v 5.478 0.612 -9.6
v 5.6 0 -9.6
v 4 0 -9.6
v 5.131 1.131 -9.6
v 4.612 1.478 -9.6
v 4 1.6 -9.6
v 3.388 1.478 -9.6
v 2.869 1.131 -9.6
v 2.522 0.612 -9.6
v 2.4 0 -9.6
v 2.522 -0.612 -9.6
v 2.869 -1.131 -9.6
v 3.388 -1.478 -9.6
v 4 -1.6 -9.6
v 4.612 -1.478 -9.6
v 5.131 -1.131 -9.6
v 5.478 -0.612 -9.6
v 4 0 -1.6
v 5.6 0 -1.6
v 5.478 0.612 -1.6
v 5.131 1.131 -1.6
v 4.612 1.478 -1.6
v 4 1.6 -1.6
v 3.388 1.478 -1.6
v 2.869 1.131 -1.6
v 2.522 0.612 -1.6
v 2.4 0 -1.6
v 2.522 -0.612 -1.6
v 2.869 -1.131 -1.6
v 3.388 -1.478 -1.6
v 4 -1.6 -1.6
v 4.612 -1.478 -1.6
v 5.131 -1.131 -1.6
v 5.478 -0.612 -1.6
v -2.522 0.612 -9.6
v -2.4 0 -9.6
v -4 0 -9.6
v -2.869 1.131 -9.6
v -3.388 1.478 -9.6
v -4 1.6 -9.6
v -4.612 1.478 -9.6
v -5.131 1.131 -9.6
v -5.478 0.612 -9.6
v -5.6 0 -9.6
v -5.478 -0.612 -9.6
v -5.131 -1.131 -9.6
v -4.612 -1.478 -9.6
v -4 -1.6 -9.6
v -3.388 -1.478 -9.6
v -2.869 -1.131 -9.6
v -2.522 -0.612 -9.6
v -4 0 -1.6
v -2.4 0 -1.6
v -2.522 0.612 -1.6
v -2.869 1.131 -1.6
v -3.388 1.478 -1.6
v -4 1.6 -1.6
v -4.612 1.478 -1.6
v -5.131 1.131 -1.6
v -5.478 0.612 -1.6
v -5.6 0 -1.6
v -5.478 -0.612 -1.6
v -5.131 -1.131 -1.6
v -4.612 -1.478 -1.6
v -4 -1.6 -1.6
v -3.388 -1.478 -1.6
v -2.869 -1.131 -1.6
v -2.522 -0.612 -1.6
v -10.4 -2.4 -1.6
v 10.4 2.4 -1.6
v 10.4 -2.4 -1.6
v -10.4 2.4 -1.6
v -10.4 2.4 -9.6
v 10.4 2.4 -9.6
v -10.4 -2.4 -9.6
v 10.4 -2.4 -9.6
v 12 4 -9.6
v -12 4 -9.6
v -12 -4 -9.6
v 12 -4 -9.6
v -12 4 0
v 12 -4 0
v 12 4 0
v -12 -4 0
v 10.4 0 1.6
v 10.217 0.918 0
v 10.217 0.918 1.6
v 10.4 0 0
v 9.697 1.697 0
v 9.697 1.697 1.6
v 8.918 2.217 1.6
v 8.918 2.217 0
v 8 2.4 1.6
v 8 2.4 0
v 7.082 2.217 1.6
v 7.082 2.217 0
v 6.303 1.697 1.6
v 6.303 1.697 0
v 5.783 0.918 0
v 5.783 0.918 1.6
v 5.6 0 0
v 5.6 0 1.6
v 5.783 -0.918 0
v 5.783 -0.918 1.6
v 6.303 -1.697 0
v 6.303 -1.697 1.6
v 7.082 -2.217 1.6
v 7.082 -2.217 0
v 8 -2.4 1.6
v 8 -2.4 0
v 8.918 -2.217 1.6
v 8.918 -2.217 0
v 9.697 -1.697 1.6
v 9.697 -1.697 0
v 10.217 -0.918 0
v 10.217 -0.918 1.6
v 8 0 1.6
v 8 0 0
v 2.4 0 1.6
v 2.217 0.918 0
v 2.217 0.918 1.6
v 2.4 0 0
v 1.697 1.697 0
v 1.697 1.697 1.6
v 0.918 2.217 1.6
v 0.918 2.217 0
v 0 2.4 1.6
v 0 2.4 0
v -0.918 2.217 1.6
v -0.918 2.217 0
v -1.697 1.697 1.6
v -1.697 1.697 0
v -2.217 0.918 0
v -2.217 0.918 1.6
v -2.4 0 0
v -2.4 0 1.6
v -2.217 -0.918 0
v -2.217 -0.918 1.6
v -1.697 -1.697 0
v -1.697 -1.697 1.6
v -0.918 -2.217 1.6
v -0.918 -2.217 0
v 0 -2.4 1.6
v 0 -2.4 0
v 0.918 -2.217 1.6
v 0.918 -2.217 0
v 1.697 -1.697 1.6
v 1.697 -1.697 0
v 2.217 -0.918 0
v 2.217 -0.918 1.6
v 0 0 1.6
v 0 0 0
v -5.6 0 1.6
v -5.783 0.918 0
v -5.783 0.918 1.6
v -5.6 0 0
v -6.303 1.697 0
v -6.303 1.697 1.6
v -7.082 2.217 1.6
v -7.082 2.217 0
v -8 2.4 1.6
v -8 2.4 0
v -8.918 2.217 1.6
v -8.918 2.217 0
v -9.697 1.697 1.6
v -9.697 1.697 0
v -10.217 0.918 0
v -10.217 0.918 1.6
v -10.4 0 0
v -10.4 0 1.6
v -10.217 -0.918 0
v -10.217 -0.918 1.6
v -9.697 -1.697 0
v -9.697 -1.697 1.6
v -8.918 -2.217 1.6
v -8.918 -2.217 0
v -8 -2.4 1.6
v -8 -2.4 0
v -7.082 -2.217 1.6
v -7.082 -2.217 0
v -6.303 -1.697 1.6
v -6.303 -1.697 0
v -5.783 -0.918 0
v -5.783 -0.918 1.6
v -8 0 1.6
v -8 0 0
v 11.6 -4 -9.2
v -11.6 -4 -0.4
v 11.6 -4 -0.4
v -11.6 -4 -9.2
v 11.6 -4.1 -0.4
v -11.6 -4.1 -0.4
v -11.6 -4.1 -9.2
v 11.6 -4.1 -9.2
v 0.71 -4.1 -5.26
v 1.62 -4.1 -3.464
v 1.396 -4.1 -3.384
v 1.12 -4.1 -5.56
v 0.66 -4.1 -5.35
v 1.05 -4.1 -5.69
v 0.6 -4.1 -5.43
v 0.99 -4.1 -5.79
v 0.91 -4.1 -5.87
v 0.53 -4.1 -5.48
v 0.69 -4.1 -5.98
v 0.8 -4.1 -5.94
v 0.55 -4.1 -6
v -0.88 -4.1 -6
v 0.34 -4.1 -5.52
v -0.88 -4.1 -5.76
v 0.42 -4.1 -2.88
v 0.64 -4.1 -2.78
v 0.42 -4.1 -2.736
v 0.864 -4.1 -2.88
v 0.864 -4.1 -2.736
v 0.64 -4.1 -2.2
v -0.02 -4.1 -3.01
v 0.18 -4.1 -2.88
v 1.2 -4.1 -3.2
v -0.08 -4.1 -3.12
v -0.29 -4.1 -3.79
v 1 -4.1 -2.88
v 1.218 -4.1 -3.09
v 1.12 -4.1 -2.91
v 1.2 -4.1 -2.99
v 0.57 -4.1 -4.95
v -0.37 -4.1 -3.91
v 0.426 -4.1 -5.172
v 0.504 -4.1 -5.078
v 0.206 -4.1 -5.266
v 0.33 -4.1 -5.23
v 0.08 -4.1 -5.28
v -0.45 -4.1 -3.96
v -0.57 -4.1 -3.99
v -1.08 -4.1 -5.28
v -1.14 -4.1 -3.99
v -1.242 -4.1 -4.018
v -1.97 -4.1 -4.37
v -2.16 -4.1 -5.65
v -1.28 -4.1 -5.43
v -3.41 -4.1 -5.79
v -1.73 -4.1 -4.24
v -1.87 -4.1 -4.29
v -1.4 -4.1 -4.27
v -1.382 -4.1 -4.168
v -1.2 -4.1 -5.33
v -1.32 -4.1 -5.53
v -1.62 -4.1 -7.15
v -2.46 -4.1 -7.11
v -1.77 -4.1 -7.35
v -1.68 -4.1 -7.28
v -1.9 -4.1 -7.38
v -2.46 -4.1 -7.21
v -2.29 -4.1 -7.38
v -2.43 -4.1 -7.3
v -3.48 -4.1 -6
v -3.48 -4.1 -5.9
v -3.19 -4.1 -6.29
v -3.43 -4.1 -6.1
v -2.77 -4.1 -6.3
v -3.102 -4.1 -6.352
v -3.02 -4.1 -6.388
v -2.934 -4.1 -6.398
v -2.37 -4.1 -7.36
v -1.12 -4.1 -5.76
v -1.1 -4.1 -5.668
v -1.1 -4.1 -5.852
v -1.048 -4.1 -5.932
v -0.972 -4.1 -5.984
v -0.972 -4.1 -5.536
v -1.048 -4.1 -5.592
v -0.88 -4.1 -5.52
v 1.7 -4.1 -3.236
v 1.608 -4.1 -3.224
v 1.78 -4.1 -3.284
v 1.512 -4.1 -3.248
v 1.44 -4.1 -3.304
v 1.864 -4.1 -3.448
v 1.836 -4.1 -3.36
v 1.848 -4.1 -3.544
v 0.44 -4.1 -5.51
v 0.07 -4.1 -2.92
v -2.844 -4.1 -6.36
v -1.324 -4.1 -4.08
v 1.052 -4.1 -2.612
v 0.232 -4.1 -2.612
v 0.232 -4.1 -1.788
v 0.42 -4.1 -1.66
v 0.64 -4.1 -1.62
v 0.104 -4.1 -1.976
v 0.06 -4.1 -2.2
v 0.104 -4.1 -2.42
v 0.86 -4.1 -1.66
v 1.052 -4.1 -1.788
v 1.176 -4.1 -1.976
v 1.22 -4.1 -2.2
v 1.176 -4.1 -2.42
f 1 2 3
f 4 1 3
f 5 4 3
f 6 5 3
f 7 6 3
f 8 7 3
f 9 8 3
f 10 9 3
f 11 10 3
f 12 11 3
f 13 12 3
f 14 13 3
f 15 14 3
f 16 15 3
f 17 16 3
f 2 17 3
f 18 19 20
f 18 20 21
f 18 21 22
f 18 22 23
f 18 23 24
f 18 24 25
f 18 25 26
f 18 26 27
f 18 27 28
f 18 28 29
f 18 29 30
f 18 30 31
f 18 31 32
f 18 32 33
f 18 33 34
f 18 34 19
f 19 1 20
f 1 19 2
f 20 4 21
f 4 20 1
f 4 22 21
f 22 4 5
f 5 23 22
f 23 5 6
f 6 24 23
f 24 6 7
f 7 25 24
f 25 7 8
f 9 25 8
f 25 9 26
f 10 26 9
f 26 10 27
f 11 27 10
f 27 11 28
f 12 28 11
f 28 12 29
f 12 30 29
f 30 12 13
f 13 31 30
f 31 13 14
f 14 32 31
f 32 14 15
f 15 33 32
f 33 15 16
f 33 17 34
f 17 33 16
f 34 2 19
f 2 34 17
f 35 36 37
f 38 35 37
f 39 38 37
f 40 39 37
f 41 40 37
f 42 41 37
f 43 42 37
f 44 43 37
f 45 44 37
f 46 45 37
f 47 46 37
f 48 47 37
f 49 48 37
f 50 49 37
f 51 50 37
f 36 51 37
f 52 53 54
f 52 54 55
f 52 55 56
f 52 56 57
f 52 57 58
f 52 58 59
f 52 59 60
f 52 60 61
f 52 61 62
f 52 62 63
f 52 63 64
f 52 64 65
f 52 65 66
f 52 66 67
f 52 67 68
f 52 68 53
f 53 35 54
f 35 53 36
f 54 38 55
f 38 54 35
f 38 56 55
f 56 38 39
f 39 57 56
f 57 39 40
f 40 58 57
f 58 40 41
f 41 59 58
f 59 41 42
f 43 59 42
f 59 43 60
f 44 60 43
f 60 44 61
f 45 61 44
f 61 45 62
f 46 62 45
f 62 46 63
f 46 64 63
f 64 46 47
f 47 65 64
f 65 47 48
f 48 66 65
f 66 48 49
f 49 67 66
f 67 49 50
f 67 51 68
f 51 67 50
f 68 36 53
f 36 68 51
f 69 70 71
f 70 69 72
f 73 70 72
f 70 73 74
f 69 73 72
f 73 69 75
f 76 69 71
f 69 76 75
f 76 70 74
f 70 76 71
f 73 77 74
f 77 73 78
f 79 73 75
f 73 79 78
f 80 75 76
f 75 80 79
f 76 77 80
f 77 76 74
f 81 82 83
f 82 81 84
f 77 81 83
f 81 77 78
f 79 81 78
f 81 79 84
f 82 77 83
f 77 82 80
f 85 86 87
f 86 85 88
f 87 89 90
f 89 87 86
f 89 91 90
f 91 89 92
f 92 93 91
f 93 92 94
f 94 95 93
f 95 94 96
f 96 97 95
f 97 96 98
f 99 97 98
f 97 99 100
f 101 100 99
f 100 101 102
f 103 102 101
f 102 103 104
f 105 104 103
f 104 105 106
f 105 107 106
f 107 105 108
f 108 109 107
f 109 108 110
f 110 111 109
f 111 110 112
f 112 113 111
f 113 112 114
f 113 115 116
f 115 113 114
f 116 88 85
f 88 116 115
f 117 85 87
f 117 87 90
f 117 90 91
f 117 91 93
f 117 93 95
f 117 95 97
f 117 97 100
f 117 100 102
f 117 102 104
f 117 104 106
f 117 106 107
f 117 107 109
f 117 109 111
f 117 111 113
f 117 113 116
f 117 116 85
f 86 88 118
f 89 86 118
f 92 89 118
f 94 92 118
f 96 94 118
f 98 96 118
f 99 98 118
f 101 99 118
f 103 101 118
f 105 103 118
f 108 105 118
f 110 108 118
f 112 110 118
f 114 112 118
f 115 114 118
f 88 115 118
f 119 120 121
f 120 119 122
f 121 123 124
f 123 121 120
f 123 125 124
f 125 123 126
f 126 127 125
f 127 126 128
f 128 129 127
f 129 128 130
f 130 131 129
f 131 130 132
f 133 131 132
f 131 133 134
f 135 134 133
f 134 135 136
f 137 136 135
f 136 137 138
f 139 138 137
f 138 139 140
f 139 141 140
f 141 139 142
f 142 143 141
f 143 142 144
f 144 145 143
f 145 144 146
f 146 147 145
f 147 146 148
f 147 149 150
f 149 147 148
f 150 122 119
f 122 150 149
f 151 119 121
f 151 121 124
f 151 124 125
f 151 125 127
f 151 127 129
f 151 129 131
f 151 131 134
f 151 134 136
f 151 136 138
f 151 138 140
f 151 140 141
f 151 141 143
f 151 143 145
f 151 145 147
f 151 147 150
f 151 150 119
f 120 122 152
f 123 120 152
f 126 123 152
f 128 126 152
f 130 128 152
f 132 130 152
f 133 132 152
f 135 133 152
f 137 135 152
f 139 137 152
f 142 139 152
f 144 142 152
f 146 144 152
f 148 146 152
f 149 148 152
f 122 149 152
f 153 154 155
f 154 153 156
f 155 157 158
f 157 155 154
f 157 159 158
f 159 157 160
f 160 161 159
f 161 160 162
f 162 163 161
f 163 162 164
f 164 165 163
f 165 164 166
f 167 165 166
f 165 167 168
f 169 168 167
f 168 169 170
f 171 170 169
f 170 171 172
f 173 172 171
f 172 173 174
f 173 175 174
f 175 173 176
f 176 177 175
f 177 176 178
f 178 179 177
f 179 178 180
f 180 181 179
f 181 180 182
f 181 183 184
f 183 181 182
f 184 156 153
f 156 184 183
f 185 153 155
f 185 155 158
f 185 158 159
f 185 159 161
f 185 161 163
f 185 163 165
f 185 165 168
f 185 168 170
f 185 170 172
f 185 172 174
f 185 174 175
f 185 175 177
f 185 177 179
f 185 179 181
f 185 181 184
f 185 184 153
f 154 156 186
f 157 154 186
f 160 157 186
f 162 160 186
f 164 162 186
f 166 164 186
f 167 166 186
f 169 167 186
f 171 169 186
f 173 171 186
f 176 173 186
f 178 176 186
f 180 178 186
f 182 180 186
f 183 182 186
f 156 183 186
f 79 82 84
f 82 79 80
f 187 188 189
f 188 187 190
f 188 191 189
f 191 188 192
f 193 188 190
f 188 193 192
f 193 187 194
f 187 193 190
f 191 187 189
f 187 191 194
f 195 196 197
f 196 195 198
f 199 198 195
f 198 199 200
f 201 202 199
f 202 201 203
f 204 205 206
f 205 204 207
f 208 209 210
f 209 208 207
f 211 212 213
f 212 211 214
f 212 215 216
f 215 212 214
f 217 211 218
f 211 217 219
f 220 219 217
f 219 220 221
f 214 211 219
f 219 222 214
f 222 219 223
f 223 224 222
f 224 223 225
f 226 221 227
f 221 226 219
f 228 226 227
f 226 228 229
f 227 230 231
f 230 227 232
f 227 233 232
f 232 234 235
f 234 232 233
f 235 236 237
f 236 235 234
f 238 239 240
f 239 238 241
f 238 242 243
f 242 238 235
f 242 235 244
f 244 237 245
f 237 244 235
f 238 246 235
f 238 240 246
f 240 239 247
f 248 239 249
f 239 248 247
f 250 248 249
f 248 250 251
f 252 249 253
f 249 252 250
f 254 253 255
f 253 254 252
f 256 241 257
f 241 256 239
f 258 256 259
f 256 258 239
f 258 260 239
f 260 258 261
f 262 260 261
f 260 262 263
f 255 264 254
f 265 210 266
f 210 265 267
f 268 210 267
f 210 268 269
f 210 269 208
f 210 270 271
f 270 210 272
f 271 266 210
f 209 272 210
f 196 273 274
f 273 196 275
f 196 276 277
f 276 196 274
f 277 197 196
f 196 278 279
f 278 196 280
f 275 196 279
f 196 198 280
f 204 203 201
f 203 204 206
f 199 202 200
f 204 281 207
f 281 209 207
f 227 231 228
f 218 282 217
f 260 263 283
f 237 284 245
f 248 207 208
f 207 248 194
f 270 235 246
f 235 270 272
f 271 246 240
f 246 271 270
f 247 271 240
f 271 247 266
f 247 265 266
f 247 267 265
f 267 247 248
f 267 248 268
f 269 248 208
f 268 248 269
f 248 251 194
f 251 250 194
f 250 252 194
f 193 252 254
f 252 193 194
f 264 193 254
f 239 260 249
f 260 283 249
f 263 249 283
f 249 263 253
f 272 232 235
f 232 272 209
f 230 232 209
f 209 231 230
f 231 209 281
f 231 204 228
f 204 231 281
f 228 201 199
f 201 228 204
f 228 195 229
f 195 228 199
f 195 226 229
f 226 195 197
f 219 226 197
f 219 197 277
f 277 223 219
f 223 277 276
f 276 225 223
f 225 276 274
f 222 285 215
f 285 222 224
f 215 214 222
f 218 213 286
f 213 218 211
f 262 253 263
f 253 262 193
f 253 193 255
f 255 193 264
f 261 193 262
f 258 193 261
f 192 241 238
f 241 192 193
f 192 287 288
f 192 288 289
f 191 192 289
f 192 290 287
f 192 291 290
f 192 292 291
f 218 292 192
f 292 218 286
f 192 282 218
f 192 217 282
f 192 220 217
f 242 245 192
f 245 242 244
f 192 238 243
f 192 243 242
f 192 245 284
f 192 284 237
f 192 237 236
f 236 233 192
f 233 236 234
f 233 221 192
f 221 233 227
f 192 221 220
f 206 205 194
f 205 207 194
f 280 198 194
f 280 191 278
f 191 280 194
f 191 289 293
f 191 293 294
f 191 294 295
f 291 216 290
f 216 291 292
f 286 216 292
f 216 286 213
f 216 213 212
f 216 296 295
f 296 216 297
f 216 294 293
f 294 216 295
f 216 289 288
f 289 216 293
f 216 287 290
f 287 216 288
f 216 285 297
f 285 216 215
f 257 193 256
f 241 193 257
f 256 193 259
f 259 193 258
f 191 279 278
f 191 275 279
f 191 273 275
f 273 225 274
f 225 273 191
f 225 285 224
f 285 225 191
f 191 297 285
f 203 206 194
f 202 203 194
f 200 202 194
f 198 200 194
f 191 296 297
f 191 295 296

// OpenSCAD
// file: ../p/4-4edge.scad
use <../lib.scad>
function ldraw_lib__4_4edge() = [
// 0 Circle 1.0
// 0 Name: 4-4edge.dat
// 0 Author: James Jessiman
// 0 !LDRAW_ORG Primitive UPDATE 2017-01
// 0 !LICENSE Licensed under CC BY 2.0 and CC BY 4.0 : see CAreadme.txt
// 
// 0 BFC CERTIFY CCW
  [0,"BFC","CERTIFY"],
  [0,"BFC","CCW"],
// 
// 0 !HISTORY 1998-12-15 [PTadmin] Official Update 1998-10
// 0 !HISTORY 2005-12-28 [PTadmin] Official Update 2005-01
// 0 !HISTORY 2007-06-24 [PTadmin] Header formatted for Contributor Agreement
// 0 !HISTORY 2008-07-01 [PTadmin] Official Update 2008-01
// 0 !HISTORY 2017-01-15 [Steffen] BFCed
// 0 !HISTORY 2017-12-30 [PTadmin] Official Update 2017-01
// 
// 
// 2 24 1 0 0 0.9239 0 0.3827
  [2,24,1,0,0,0.9239,0,0.3827],
// 2 24 0.9239 0 0.3827 0.7071 0 0.7071
  [2,24,0.9239,0,0.3827,0.7071,0,0.7071],
// 2 24 0.7071 0 0.7071 0.3827 0 0.9239
  [2,24,0.7071,0,0.7071,0.3827,0,0.9239],
// 2 24 0.3827 0 0.9239 0 0 1
  [2,24,0.3827,0,0.9239,0,0,1],
// 2 24 0 0 1 -0.3827 0 0.9239
  [2,24,0,0,1,-0.3827,0,0.9239],
// 2 24 -0.3827 0 0.9239 -0.7071 0 0.7071
  [2,24,-0.3827,0,0.9239,-0.7071,0,0.7071],
// 2 24 -0.7071 0 0.7071 -0.9239 0 0.3827
  [2,24,-0.7071,0,0.7071,-0.9239,0,0.3827],
// 2 24 -0.9239 0 0.3827 -1 0 -0
  [2,24,-0.9239,0,0.3827,-1,0,-0],
// 2 24 -1 0 -0 -0.9239 0 -0.3827
  [2,24,-1,0,-0,-0.9239,0,-0.3827],
// 2 24 -0.9239 0 -0.3827 -0.7071 0 -0.7071
  [2,24,-0.9239,0,-0.3827,-0.7071,0,-0.7071],
// 2 24 -0.7071 0 -0.7071 -0.3827 0 -0.9239
  [2,24,-0.7071,0,-0.7071,-0.3827,0,-0.9239],
// 2 24 -0.3827 0 -0.9239 0 0 -1
  [2,24,-0.3827,0,-0.9239,0,0,-1],
// 2 24 0 0 -1 0.3827 0 -0.9239
  [2,24,0,0,-1,0.3827,0,-0.9239],
// 2 24 0.3827 0 -0.9239 0.7071 0 -0.7071
  [2,24,0.3827,0,-0.9239,0.7071,0,-0.7071],
// 2 24 0.7071 0 -0.7071 0.9239 0 -0.3827
  [2,24,0.7071,0,-0.7071,0.9239,0,-0.3827],
// 2 24 0.9239 0 -0.3827 1 0 0
  [2,24,0.9239,0,-0.3827,1,0,0],
];
module ldraw_lib__4_4edge(step=0, col=false, unit=2/5, alt=false, line=0.2, solid=!$preview)
    makepoly(ldraw_lib__4_4edge(), step=step, col=col, unit=unit, alt=alt, line=line, solid=solid);
ldraw_lib__4_4edge(line=0.2);
// file: ../p/4-4disc.scad
use <../lib.scad>
function ldraw_lib__4_4disc() = [
// 0 Disc 1.0
// 0 Name: 4-4disc.dat
// 0 Author: James Jessiman
// 0 !LDRAW_ORG Primitive UPDATE 2002-02
// 0 !LICENSE Licensed under CC BY 2.0 and CC BY 4.0 : see CAreadme.txt
// 
// 0 BFC CERTIFY CCW
  [0,"BFC","CERTIFY"],
  [0,"BFC","CCW"],
// 
// 0 !HISTORY 1998-12-15 [PTadmin] Official Update 1998-10
// 0 !HISTORY 2002-03-23 [sbliss] Added BFC statement
// 0 !HISTORY 2002-04-25 [PTadmin] Official Update 2002-02
// 0 !HISTORY 2007-06-24 [PTadmin] Header formatted for Contributor Agreement
// 0 !HISTORY 2008-07-01 [PTadmin] Official Update 2008-01
// 
// 
// 3 16 0 0 0 1 0 0 0.9239 0 0.3827
  [3,16,0,0,0,1,0,0,0.9239,0,0.3827],
// 3 16 0 0 0 0.9239 0 0.3827 0.7071 0 0.7071
  [3,16,0,0,0,0.9239,0,0.3827,0.7071,0,0.7071],
// 3 16 0 0 0 0.7071 0 0.7071 0.3827 0 0.9239
  [3,16,0,0,0,0.7071,0,0.7071,0.3827,0,0.9239],
// 3 16 0 0 0 0.3827 0 0.9239 0 0 1
  [3,16,0,0,0,0.3827,0,0.9239,0,0,1],
// 3 16 0 0 0 0 0 1 -0.3827 0 0.9239
  [3,16,0,0,0,0,0,1,-0.3827,0,0.9239],
// 3 16 0 0 0 -0.3827 0 0.9239 -0.7071 0 0.7071
  [3,16,0,0,0,-0.3827,0,0.9239,-0.7071,0,0.7071],
// 3 16 0 0 0 -0.7071 0 0.7071 -0.9239 0 0.3827
  [3,16,0,0,0,-0.7071,0,0.7071,-0.9239,0,0.3827],
// 3 16 0 0 0 -0.9239 0 0.3827 -1 0 -0
  [3,16,0,0,0,-0.9239,0,0.3827,-1,0,-0],
// 3 16 0 0 0 -1 0 -0 -0.9239 0 -0.3827
  [3,16,0,0,0,-1,0,-0,-0.9239,0,-0.3827],
// 3 16 0 0 0 -0.9239 0 -0.3827 -0.7071 0 -0.7071
  [3,16,0,0,0,-0.9239,0,-0.3827,-0.7071,0,-0.7071],
// 3 16 0 0 0 -0.7071 0 -0.7071 -0.3827 0 -0.9239
  [3,16,0,0,0,-0.7071,0,-0.7071,-0.3827,0,-0.9239],
// 3 16 0 0 0 -0.3827 0 -0.9239 0 0 -1
  [3,16,0,0,0,-0.3827,0,-0.9239,0,0,-1],
// 3 16 0 0 0 0 0 -1 0.3827 0 -0.9239
  [3,16,0,0,0,0,0,-1,0.3827,0,-0.9239],
// 3 16 0 0 0 0.3827 0 -0.9239 0.7071 0 -0.7071
  [3,16,0,0,0,0.3827,0,-0.9239,0.7071,0,-0.7071],
// 3 16 0 0 0 0.7071 0 -0.7071 0.9239 0 -0.3827
  [3,16,0,0,0,0.7071,0,-0.7071,0.9239,0,-0.3827],
// 3 16 0 0 0 0.9239 0 -0.3827 1 0 0
  [3,16,0,0,0,0.9239,0,-0.3827,1,0,0],
// 0
];
module ldraw_lib__4_4disc(step=0, col=false, unit=2/5, alt=false, line=0.2, solid=!$preview)
    makepoly(ldraw_lib__4_4disc(), step=step, col=col, unit=unit, alt=alt, line=line, solid=solid);
ldraw_lib__4_4disc(line=0.2);
// file: ../p/4-4cyli.scad
use <../lib.scad>
$fa=1; $fs=0.2;
function ldraw_lib__4_4cyli(realsolid=false) = [
// 0 Cylinder 1.0
// 0 Name: 4-4cyli.dat
// 0 Author: James Jessiman
// 0 !LDRAW_ORG Primitive UPDATE 2005-01
// 0 !LICENSE Licensed under CC BY 2.0 and CC BY 4.0 : see CAreadme.txt
// 
// 0 BFC CERTIFY CCW
  [0,"BFC","CERTIFY"],
  [0,"BFC","CCW"],
// 
// 0 !HISTORY 1998-12-15 [PTadmin] Official Update 1998-10
// 0 !HISTORY 2002-03-23 [sbliss] Added BFC statement; merged headers from files in distributions LDraw 0.27 and Complete.
// 0 !HISTORY 2002-04-25 [PTadmin] Official Update 2002-02
// 0 !HISTORY 2004-12-14 [guyvivan] BFC CCW
// 0 !HISTORY 2005-12-28 [PTadmin] Official Update 2005-01
// 0 !HISTORY 2007-06-24 [PTadmin] Header formatted for Contributor Agreement
// 0 !HISTORY 2008-07-01 [PTadmin] Official Update 2008-01
// 
// 
// 4 16 1 1 0 0.9239 1 0.3827 0.9239 0 0.3827 1 0 0
  [4,16,1,1,0,0.9239,1,0.3827,0.9239,0,0.3827,1,0,0],
// 5 24 1 0 0 1 1 0 0.9239 0 0.3827 0.9239 0 -0.3827
  [5,24,1,0,0,1,1,0,0.9239,0,0.3827,0.9239,0,-0.3827],
// 4 16 0.9239 1 0.3827 0.7071 1 0.7071 0.7071 0 0.7071 0.9239 0 0.3827
  [4,16,0.9239,1,0.3827,0.7071,1,0.7071,0.7071,0,0.7071,0.9239,0,0.3827],
// 5 24 0.9239 0 0.3827 0.9239 1 0.3827 0.7071 0 0.7071 1 0 0
  [5,24,0.9239,0,0.3827,0.9239,1,0.3827,0.7071,0,0.7071,1,0,0],
// 4 16 0.7071 1 0.7071 0.3827 1 0.9239 0.3827 0 0.9239 0.7071 0 0.7071
  [4,16,0.7071,1,0.7071,0.3827,1,0.9239,0.3827,0,0.9239,0.7071,0,0.7071],
// 5 24 0.7071 0 0.7071 0.7071 1 0.7071 0.3827 0 0.9239 0.9239 0 0.3827
  [5,24,0.7071,0,0.7071,0.7071,1,0.7071,0.3827,0,0.9239,0.9239,0,0.3827],
// 4 16 0.3827 1 0.9239 0 1 1 0 0 1 0.3827 0 0.9239
  [4,16,0.3827,1,0.9239,0,1,1,0,0,1,0.3827,0,0.9239],
// 5 24 0.3827 0 0.9239 0.3827 1 0.9239 0 0 1 0.7071 0 0.7071
  [5,24,0.3827,0,0.9239,0.3827,1,0.9239,0,0,1,0.7071,0,0.7071],
// 4 16 0 1 1 -0.3827 1 0.9239 -0.3827 0 0.9239 0 0 1
  [4,16,0,1,1,-0.3827,1,0.9239,-0.3827,0,0.9239,0,0,1],
// 5 24 0 0 1 0 1 1 -0.3827 0 0.9239 0.3827 0 0.9239
  [5,24,0,0,1,0,1,1,-0.3827,0,0.9239,0.3827,0,0.9239],
// 4 16 -0.3827 1 0.9239 -0.7071 1 0.7071 -0.7071 0 0.7071 -0.3827 0 0.9239
  [4,16,-0.3827,1,0.9239,-0.7071,1,0.7071,-0.7071,0,0.7071,-0.3827,0,0.9239],
// 5 24 -0.3827 0 0.9239 -0.3827 1 0.9239 -0.7071 0 0.7071 0 0 1
  [5,24,-0.3827,0,0.9239,-0.3827,1,0.9239,-0.7071,0,0.7071,0,0,1],
// 4 16 -0.7071 1 0.7071 -0.9239 1 0.3827 -0.9239 0 0.3827 -0.7071 0 0.7071
  [4,16,-0.7071,1,0.7071,-0.9239,1,0.3827,-0.9239,0,0.3827,-0.7071,0,0.7071],
// 5 24 -0.7071 0 0.7071 -0.7071 1 0.7071 -0.9239 0 0.3827 -0.3827 0 0.9239
  [5,24,-0.7071,0,0.7071,-0.7071,1,0.7071,-0.9239,0,0.3827,-0.3827,0,0.9239],
// 4 16 -0.9239 1 0.3827 -1 1 0 -1 0 0 -0.9239 0 0.3827
  [4,16,-0.9239,1,0.3827,-1,1,0,-1,0,0,-0.9239,0,0.3827],
// 5 24 -0.9239 0 0.3827 -0.9239 1 0.3827 -1 0 0 -0.7071 0 0.7071
  [5,24,-0.9239,0,0.3827,-0.9239,1,0.3827,-1,0,0,-0.7071,0,0.7071],
// 4 16 -1 1 0 -0.9239 1 -0.3827 -0.9239 0 -0.3827 -1 0 0
  [4,16,-1,1,0,-0.9239,1,-0.3827,-0.9239,0,-0.3827,-1,0,0],
// 5 24 -1 0 0 -1 1 0 -0.9239 0 -0.3827 -0.9239 0 0.3827
  [5,24,-1,0,0,-1,1,0,-0.9239,0,-0.3827,-0.9239,0,0.3827],
// 4 16 -0.9239 1 -0.3827 -0.7071 1 -0.7071 -0.7071 0 -0.7071 -0.9239 0 -0.3827
  [4,16,-0.9239,1,-0.3827,-0.7071,1,-0.7071,-0.7071,0,-0.7071,-0.9239,0,-0.3827],
// 5 24 -0.9239 0 -0.3827 -0.9239 1 -0.3827 -0.7071 0 -0.7071 -1 0 0
  [5,24,-0.9239,0,-0.3827,-0.9239,1,-0.3827,-0.7071,0,-0.7071,-1,0,0],
// 4 16 -0.7071 1 -0.7071 -0.3827 1 -0.9239 -0.3827 0 -0.9239 -0.7071 0 -0.7071
  [4,16,-0.7071,1,-0.7071,-0.3827,1,-0.9239,-0.3827,0,-0.9239,-0.7071,0,-0.7071],
// 5 24 -0.7071 0 -0.7071 -0.7071 1 -0.7071 -0.3827 0 -0.9239 -0.9239 0 -0.3827
  [5,24,-0.7071,0,-0.7071,-0.7071,1,-0.7071,-0.3827,0,-0.9239,-0.9239,0,-0.3827],
// 4 16 -0.3827 1 -0.9239 0 1 -1 0 0 -1 -0.3827 0 -0.9239
  [4,16,-0.3827,1,-0.9239,0,1,-1,0,0,-1,-0.3827,0,-0.9239],
// 5 24 -0.3827 0 -0.9239 -0.3827 1 -0.9239 0 0 -1 -0.7071 0 -0.7071
  [5,24,-0.3827,0,-0.9239,-0.3827,1,-0.9239,0,0,-1,-0.7071,0,-0.7071],
// 4 16 0 1 -1 0.3827 1 -0.9239 0.3827 0 -0.9239 0 0 -1
  [4,16,0,1,-1,0.3827,1,-0.9239,0.3827,0,-0.9239,0,0,-1],
// 5 24 0 0 -1 0 1 -1 0.3827 0 -0.9239 -0.3827 0 -0.9239
  [5,24,0,0,-1,0,1,-1,0.3827,0,-0.9239,-0.3827,0,-0.9239],
// 4 16 0.3827 1 -0.9239 0.7071 1 -0.7071 0.7071 0 -0.7071 0.3827 0 -0.9239
  [4,16,0.3827,1,-0.9239,0.7071,1,-0.7071,0.7071,0,-0.7071,0.3827,0,-0.9239],
// 5 24 0.3827 0 -0.9239 0.3827 1 -0.9239 0.7071 0 -0.7071 0 0 -1
  [5,24,0.3827,0,-0.9239,0.3827,1,-0.9239,0.7071,0,-0.7071,0,0,-1],
// 4 16 0.7071 1 -0.7071 0.9239 1 -0.3827 0.9239 0 -0.3827 0.7071 0 -0.7071
  [4,16,0.7071,1,-0.7071,0.9239,1,-0.3827,0.9239,0,-0.3827,0.7071,0,-0.7071],
// 5 24 0.7071 0 -0.7071 0.7071 1 -0.7071 0.9239 0 -0.3827 0.3827 0 -0.9239
  [5,24,0.7071,0,-0.7071,0.7071,1,-0.7071,0.9239,0,-0.3827,0.3827,0,-0.9239],
// 4 16 0.9239 1 -0.3827 1 1 0 1 0 0 0.9239 0 -0.3827
  [4,16,0.9239,1,-0.3827,1,1,0,1,0,0,0.9239,0,-0.3827],
// 5 24 0.9239 0 -0.3827 0.9239 1 -0.3827 1 0 0 0.7071 0 -0.7071
  [5,24,0.9239,0,-0.3827,0.9239,1,-0.3827,1,0,0,0.7071,0,-0.7071],
// 0
];
module ldraw_lib__4_4cyli(step=0, col=false, unit=2/5, alt=false, line=0.2, solid=!$preview)
    makepoly(ldraw_lib__4_4cyli(solid), step=step, col=col, unit=unit, alt=alt, line=line, solid=solid);
ldraw_lib__4_4cyli(line=0.2);
// file: ../p/stud3.scad
use <../lib.scad>
use <4-4cyli.scad>
use <4-4disc.scad>
use <4-4edge.scad>
function ldraw_lib__stud3() = [
// 0 Stud Tube Solid
// 0 Name: stud3.dat
// 0 Author: James Jessiman
// 0 !LDRAW_ORG Primitive UPDATE 2012-01
// 0 !LICENSE Licensed under CC BY 4.0 : see CAreadme.txt
// 
// 0 BFC CERTIFY CCW
  [0,"BFC","CERTIFY"],
  [0,"BFC","CCW"],
// 
// 0 !HISTORY 2002-04-04 [sbliss] Modified for BFC compliance
// 0 !HISTORY 2002-04-25 [PTadmin] Official Update 2002-02
// 0 !HISTORY 2007-06-24 [PTadmin] Header formatted for Contributor Agreement
// 0 !HISTORY 2008-07-01 [PTadmin] Official Update 2008-01
// 0 !HISTORY 2012-02-16 [Philo] Changed to CCW
// 0 !HISTORY 2012-03-30 [PTadmin] Official Update 2012-01
// 
// 
// 1 16 0 -4 0 4 0 0 0 1 0 0 0 4 4-4edge.dat
  [1,16,0,-4,0,4,0,0,0,1,0,0,0,4, ldraw_lib__4_4edge()],
// 1 16 0 0 0 4 0 0 0 1 0 0 0 4 4-4edge.dat
  [1,16,0,0,0,4,0,0,0,1,0,0,0,4, ldraw_lib__4_4edge()],
// 1 16 0 -4 0 4 0 0 0 1 0 0 0 4 4-4disc.dat
  [1,16,0,-4,0,4,0,0,0,1,0,0,0,4, ldraw_lib__4_4disc()],
  [-1,16,0,0,0,4,0,0,0,-1,0,0,0,4, ldraw_lib__4_4disc()],
// 1 16 0 -4 0 4 0 0 0 4 0 0 0 4 4-4cyli.dat
  [1,16,0,-4,0,4,0,0,0,4,0,0,0,4, ldraw_lib__4_4cyli()],
];
module ldraw_lib__stud3(step=0, col=false, unit=2/5, alt=false, line=0.2, solid=!$preview)
    makepoly(ldraw_lib__stud3(), step=step, col=col, unit=unit, alt=alt, line=line, solid=solid);
ldraw_lib__stud3(line=0.2);
// file: ../p/stud.scad
use <../lib.scad>
use <4-4cyli.scad>
use <4-4disc.scad>
use <4-4edge.scad>
function ldraw_lib__stud() = [
// 0 Stud
// 0 Name: stud.dat
// 0 Author: James Jessiman
// 0 !LDRAW_ORG Primitive UPDATE 2012-01
// 0 !LICENSE Licensed under CC BY 4.0 : see CAreadme.txt
// 
// 0 BFC CERTIFY CCW
  [0,"BFC","CERTIFY"],
  [0,"BFC","CCW"],
// 
// 0 !HISTORY 2002-04-04 [sbliss] Modified for BFC compliance
// 0 !HISTORY 2002-04-25 [PTadmin] Official Update 2002-02
// 0 !HISTORY 2007-06-24 [PTadmin] Header formatted for Contributor Agreement
// 0 !HISTORY 2008-07-01 [PTadmin] Official Update 2008-01
// 0 !HISTORY 2012-02-16 [Philo] Changed to CCW
// 0 !HISTORY 2012-03-30 [PTadmin] Official Update 2012-01
// 
// 
// 1 16 0 0 0 6 0 0 0 1 0 0 0 6 4-4edge.dat
  [1,16,0,0,0,6,0,0,0,1,0,0,0,6, ldraw_lib__4_4edge()],
// 1 16 0 -4 0 6 0 0 0 1 0 0 0 6 4-4edge.dat
  [1,16,0,-4,0,6,0,0,0,1,0,0,0,6, ldraw_lib__4_4edge()],
// 1 16 0 0 0 6 0 0 0 -4 0 0 0 6 4-4cyli.dat
  [1,16,0,0,0,6,0,0,0,-4,0,0,0,6, ldraw_lib__4_4cyli()],
// 1 16 0 -4 0 6 0 0 0 1 0 0 0 6 4-4disc.dat
  [1,16,0,-4,0,6,0,0,0,1,0,0,0,6, ldraw_lib__4_4disc()],
  [-1,16,0,0,0,6,0,0,0,-1,0,0,0,6, ldraw_lib__4_4disc()],
];
module ldraw_lib__stud(step=0, col=false, unit=2/5, alt=false, line=0.2, solid=!$preview)
    makepoly(ldraw_lib__stud(), step=step, col=col, unit=unit, alt=alt, line=line, solid=solid);
ldraw_lib__stud(line=0.2);
// file: ../p/box5.scad
use <../lib.scad>
function ldraw_lib__box5() = [
// 0 Box with 5 Faces and All Edges
// 0 Name: box5.dat
// 0 Author: James Jessiman
// 0 !LDRAW_ORG Primitive UPDATE 2012-01
// 0 !LICENSE Licensed under CC BY 2.0 and CC BY 4.0 : see CAreadme.txt
// 
// 0 BFC CERTIFY CCW
  [0,"BFC","CERTIFY"],
  [0,"BFC","CCW"],
// 
// 0 !HISTORY 2002-04-03 [sbliss] Modified for BFC compliance
// 0 !HISTORY 2002-04-25 [PTadmin] Official Update 2002-02
// 0 !HISTORY 2007-06-24 [PTadmin] Header formatted for Contributor Agreement
// 0 !HISTORY 2008-07-01 [PTadmin] Official Update 2008-01
// 0 !HISTORY 2012-02-16 [Philo] Changed to CCW
// 0 !HISTORY 2012-03-30 [PTadmin] Official Update 2012-01
// 
// 
// 2 24 1 1 1 -1 1 1
  [2,24,1,1,1,-1,1,1],
// 2 24 -1 1 1 -1 1 -1
  [2,24,-1,1,1,-1,1,-1],
// 2 24 -1 1 -1 1 1 -1
  [2,24,-1,1,-1,1,1,-1],
// 2 24 1 1 -1 1 1 1
  [2,24,1,1,-1,1,1,1],
// 2 24 1 0 1 -1 0 1
  [2,24,1,0,1,-1,0,1],
// 2 24 -1 0 1 -1 0 -1
  [2,24,-1,0,1,-1,0,-1],
// 2 24 -1 0 -1 1 0 -1
  [2,24,-1,0,-1,1,0,-1],
// 2 24 1 0 -1 1 0 1
  [2,24,1,0,-1,1,0,1],
// 2 24 1 0 1 1 1 1
  [2,24,1,0,1,1,1,1],
// 2 24 -1 0 1 -1 1 1
  [2,24,-1,0,1,-1,1,1],
// 2 24 1 0 -1 1 1 -1
  [2,24,1,0,-1,1,1,-1],
// 2 24 -1 0 -1 -1 1 -1
  [2,24,-1,0,-1,-1,1,-1],
// 4 16 -1 1 1 1 1 1 1 1 -1 -1 1 -1
  [4,16,-1,1,1,1,1,1,1,1,-1,-1,1,-1],
// 4 16 -1 1 1 -1 0 1 1 0 1 1 1 1
  [4,16,-1,1,1,-1,0,1,1,0,1,1,1,1],
// 4 16 -1 1 -1 -1 0 -1 -1 0 1 -1 1 1
  [4,16,-1,1,-1,-1,0,-1,-1,0,1,-1,1,1],
// 4 16 1 1 -1 1 0 -1 -1 0 -1 -1 1 -1
  [4,16,1,1,-1,1,0,-1,-1,0,-1,-1,1,-1],
// 4 16 1 1 1 1 0 1 1 0 -1 1 1 -1
  [4,16,1,1,1,1,0,1,1,0,-1,1,1,-1],
];
makepoly(ldraw_lib__box5(), line=0.2);
// file: ../p/box4t.scad
use <../lib.scad>
function ldraw_lib__box4t() = [
// 0 Box with 4 Adjacent Faces and All Edges
// 0 Name: box4t.dat
// 0 Author: Tore Eriksson [Tore_Eriksson]
// 0 !LDRAW_ORG Primitive UPDATE 2003-02
// 0 !LICENSE Licensed under CC BY 2.0 and CC BY 4.0 : see CAreadme.txt
// 
// 0 BFC CERTIFY CCW
  [0,"BFC","CERTIFY"],
  [0,"BFC","CCW"],
// 
// 0 !HISTORY 1997-09-29 [PTadmin] Official Update 1997-15
// 0 !HISTORY 2002-08-31 [izanette] Modified with WINDZ for BFC compliance
// 0 !HISTORY 2003-08-01 [PTadmin] Official Update 2003-02
// 0 !HISTORY 2007-06-24 [PTadmin] Header formatted for Contributor Agreement
// 0 !HISTORY 2008-07-01 [PTadmin] Official Update 2008-01
// 
// 
// 2 24 1 1 1 -1 1 1
  [2,24,1,1,1,-1,1,1],
// 2 24 -1 1 1 -1 1 -1
  [2,24,-1,1,1,-1,1,-1],
// 2 24 -1 1 -1 1 1 -1
  [2,24,-1,1,-1,1,1,-1],
// 2 24 1 1 -1 1 1 1
  [2,24,1,1,-1,1,1,1],
// 2 24 1 0 1 -1 0 1
  [2,24,1,0,1,-1,0,1],
// 2 24 -1 0 1 -1 0 -1
  [2,24,-1,0,1,-1,0,-1],
// 2 24 -1 0 -1 1 0 -1
  [2,24,-1,0,-1,1,0,-1],
// 2 24 1 0 -1 1 0 1
  [2,24,1,0,-1,1,0,1],
// 2 24 1 0 1 1 1 1
  [2,24,1,0,1,1,1,1],
// 2 24 -1 0 1 -1 1 1
  [2,24,-1,0,1,-1,1,1],
// 2 24 1 0 -1 1 1 -1
  [2,24,1,0,-1,1,1,-1],
// 2 24 -1 0 -1 -1 1 -1
  [2,24,-1,0,-1,-1,1,-1],
// 4 16 1 1 1 1 1 -1 -1 1 -1 -1 1 1
  [4,16,1,1,1,1,1,-1,-1,1,-1,-1,1,1],
// 4 16 1 1 1 -1 1 1 -1 0 1 1 0 1
  [4,16,1,1,1,-1,1,1,-1,0,1,1,0,1],
// 4 16 -1 1 1 -1 1 -1 -1 0 -1 -1 0 1
  [4,16,-1,1,1,-1,1,-1,-1,0,-1,-1,0,1],
// 0 4 16 -1 1 -1 -1 0 -1 1 0 -1 1 1 -1
// 4 16 1 1 -1 1 1 1 1 0 1 1 0 -1
  [4,16,1,1,-1,1,1,1,1,0,1,1,0,-1],
// 0
];
makepoly(ldraw_lib__box4t(), line=0.2);
// file: ../p/box5-12.scad
use <../lib.scad>
function ldraw_lib__box5_12() = [
// 0 Box with 5 Faces without Any Edges
// 0 Name: box5-12.dat
// 0 Author: Chris Dee [cwdee]
// 0 !LDRAW_ORG Primitive UPDATE 2009-02
// 0 !LICENSE Licensed under CC BY 2.0 and CC BY 4.0 : see CAreadme.txt
// 
// 0 BFC CERTIFY CCW
  [0,"BFC","CERTIFY"],
  [0,"BFC","CCW"],
// 
// 0 !HISTORY 2009-09-03 [PTadmin] Official Update 2009-02
// 
// 
// 4 16 1 1 1 1 1 -1 -1 1 -1 -1 1 1
  [4,16,1,1,1,1,1,-1,-1,1,-1,-1,1,1],
// 4 16 -1 0 1 1 0 1 1 1 1 -1 1 1
  [4,16,-1,0,1,1,0,1,1,1,1,-1,1,1],
// 4 16 -1 0 -1 -1 0 1 -1 1 1 -1 1 -1
  [4,16,-1,0,-1,-1,0,1,-1,1,1,-1,1,-1],
// 4 16 1 0 -1 -1 0 -1 -1 1 -1 1 1 -1
  [4,16,1,0,-1,-1,0,-1,-1,1,-1,1,1,-1],
// 4 16 1 0 1 1 0 -1 1 1 -1 1 1 1
  [4,16,1,0,1,1,0,-1,1,1,-1,1,1,1],
// 0
];
module ldraw_lib__box5_12(step=0, col=false, unit=2/5, alt=false, line=0.2, solid=!$preview)
    makepoly(ldraw_lib__box5_12(), step=step, col=col, unit=unit, alt=alt, line=line, solid=solid);
ldraw_lib__box5_12(line=0.2);
// file: s/3622s01.scad
use <../../lib.scad>
use <../../p/box4t.scad>
use <../../p/box5.scad>
use <../../p/stud.scad>
use <../../p/stud3.scad>
function ldraw_lib__s__3622s01() = [
// 0 ~Brick  1 x  3 without Front Face
// 0 Name: s\3622s01.dat
// 0 Author: Andy Westrate [westrate]
// 0 !LDRAW_ORG Subpart UPDATE 2004-02
// 0 !LICENSE Licensed under CC BY 2.0 and CC BY 4.0 : see CAreadme.txt
// 
// 0 BFC CERTIFY CCW
  [0,"BFC","CERTIFY"],
  [0,"BFC","CCW"],
// 
// 0 !HISTORY 2003-10-14 [westrate] Subfiled, BFC'd
// 0 !HISTORY 2004-04-22 [PTadmin] Official Update 2004-02
// 0 !HISTORY 2007-08-31 [PTadmin] Header formatted for Contributor Agreement
// 0 !HISTORY 2008-07-01 [PTadmin] Official Update 2008-01
// 
// 
// 0 // Uncomment the following for front face
// 0 // 4 16 30 0 -10 -30 0 -10 -30 24 -10 30 24 -10
// 1 16 10 4 0 1 0 0 0 -5 0 0 0 1 stud3.dat
  [1,16,10,4,0,1,0,0,0,-5,0,0,0,1, ldraw_lib__stud3()],
// 1 16 -10 4 0 1 0 0 0 -5 0 0 0 1 stud3.dat
  [1,16,-10,4,0,1,0,0,0,-5,0,0,0,1, ldraw_lib__stud3()],
// 
// 0 BFC INVERTNEXT
  [0,"BFC","INVERTNEXT"],
// 1 16 0 24 0 26 0 0 0 -20 0 0 0 6 box5.dat
  [1,16,0,24,0,26,0,0,0,-20,0,0,0,6, ldraw_lib__box5()],
// 
// 4 16 30 24 10 26 24 6 -26 24 6 -30 24 10
  [4,16,30,24,10,26,24,6,-26,24,6,-30,24,10],
// 4 16 -30 24 10 -26 24 6 -26 24 -6 -30 24 -10
  [4,16,-30,24,10,-26,24,6,-26,24,-6,-30,24,-10],
// 4 16 -30 24 -10 -26 24 -6 26 24 -6 30 24 -10
  [4,16,-30,24,-10,-26,24,-6,26,24,-6,30,24,-10],
// 4 16 30 24 -10 26 24 -6 26 24 6 30 24 10
  [4,16,30,24,-10,26,24,-6,26,24,6,30,24,10],
// 
// 1 16 0 24 0 30 0 0 0 -24 0 0 0 10 box4t.dat
  [1,16,0,24,0,30,0,0,0,-24,0,0,0,10, ldraw_lib__box4t()],
// 
// 1 16 20 0 0 1 0 0 0 1 0 0 0 1 stud.dat
  [1,16,20,0,0,1,0,0,0,1,0,0,0,1, ldraw_lib__stud()],
// 1 16 0 0 0 1 0 0 0 1 0 0 0 1 stud.dat
  [1,16,0,0,0,1,0,0,0,1,0,0,0,1, ldraw_lib__stud()],
// 1 16 -20 0 0 1 0 0 0 1 0 0 0 1 stud.dat
  [1,16,-20,0,0,1,0,0,0,1,0,0,0,1, ldraw_lib__stud()],
// 0
];
makepoly(ldraw_lib__s__3622s01(), line=0.2);
// file: 3622.scad
use <../lib.scad>
use <s/3622s01.scad>
function ldraw_lib__3622() = [
// 0 Brick  1 x  3
// 0 Name: 3622.dat
// 0 Author: James Jessiman
// 0 !LDRAW_ORG Part UPDATE 2004-02
// 0 !LICENSE Licensed under CC BY 2.0 and CC BY 4.0 : see CAreadme.txt
// 
// 0 BFC CERTIFY CCW
  [0,"BFC","CERTIFY"],
  [0,"BFC","CCW"],
// 
// 0 !HISTORY 2003-10-15 [westrate] Subfiled, BFC'd
// 0 !HISTORY 2004-04-22 [PTadmin] Official Update 2004-02
// 0 !HISTORY 2007-06-25 [PTadmin] Header formatted for Contributor Agreement
// 0 !HISTORY 2008-07-01 [PTadmin] Official Update 2008-01
// 
// 
// 1 16 0 0 0 1 0 0 0 1 0 0 0 1 s\3622s01.dat
  [1,16,0,0,0,1,0,0,0,1,0,0,0,1, ldraw_lib__s__3622s01()],
// 4 16 30 0 -10 -30 0 -10 -30 24 -10 30 24 -10
  [4,16,30,0,-10,-30,0,-10,-30,24,-10,30,24,-10],
// 0
];
makepoly(ldraw_lib__3622(), line=0.2);
// main file
use <../lib.scad>
use <3622.scad>
use <821420c.scad>
function ldraw_lib__3622d09() = [
// 0 Brick  1 x  3 with Blue Train Passenger Car Sticker
// 0 Name: 3622d09.dat
// 0 Author: Takeshi Takahashi [RainbowDolphin]
// 0 !LDRAW_ORG Shortcut UPDATE 2024-10
// 0 !LICENSE Licensed under CC BY 4.0 : see CAreadme.txt
// 
// 0 BFC CERTIFY CCW
  [0,"BFC","CERTIFY"],
  [0,"BFC","CCW"],
// 
// 0 !CATEGORY Sticker Shortcut
// 0 !KEYWORDS Bricklink 3622pb017, Club car, set 10002, set 4547, Train
// 
// 0 !HISTORY 2024-12-01 [OrionP] Official Update 2024-10
// 
// 1 16 0 0 0 1 0 0 0 1 0 0 0 1 3622.dat
  [1,16,0,0,0,1,0,0,0,1,0,0,0,1, ldraw_lib__3622()],
// 1 16 0 12 -10 1 0 0 0 0 -1 0 1 0 821420c.dat
  [1,16,0,12,-10,1,0,0,0,0,-1,0,1,0, ldraw_lib__821420c()],
];
module ldraw_lib__3622d09(step=0, col=false, unit=2/5, alt=false, line=0.2, solid=!$preview)
    makepoly(ldraw_lib__3622d09(), step=step, col=col, unit=unit, alt=alt, line=line, solid=solid);
ldraw_lib__3622d09(line=0.2);
